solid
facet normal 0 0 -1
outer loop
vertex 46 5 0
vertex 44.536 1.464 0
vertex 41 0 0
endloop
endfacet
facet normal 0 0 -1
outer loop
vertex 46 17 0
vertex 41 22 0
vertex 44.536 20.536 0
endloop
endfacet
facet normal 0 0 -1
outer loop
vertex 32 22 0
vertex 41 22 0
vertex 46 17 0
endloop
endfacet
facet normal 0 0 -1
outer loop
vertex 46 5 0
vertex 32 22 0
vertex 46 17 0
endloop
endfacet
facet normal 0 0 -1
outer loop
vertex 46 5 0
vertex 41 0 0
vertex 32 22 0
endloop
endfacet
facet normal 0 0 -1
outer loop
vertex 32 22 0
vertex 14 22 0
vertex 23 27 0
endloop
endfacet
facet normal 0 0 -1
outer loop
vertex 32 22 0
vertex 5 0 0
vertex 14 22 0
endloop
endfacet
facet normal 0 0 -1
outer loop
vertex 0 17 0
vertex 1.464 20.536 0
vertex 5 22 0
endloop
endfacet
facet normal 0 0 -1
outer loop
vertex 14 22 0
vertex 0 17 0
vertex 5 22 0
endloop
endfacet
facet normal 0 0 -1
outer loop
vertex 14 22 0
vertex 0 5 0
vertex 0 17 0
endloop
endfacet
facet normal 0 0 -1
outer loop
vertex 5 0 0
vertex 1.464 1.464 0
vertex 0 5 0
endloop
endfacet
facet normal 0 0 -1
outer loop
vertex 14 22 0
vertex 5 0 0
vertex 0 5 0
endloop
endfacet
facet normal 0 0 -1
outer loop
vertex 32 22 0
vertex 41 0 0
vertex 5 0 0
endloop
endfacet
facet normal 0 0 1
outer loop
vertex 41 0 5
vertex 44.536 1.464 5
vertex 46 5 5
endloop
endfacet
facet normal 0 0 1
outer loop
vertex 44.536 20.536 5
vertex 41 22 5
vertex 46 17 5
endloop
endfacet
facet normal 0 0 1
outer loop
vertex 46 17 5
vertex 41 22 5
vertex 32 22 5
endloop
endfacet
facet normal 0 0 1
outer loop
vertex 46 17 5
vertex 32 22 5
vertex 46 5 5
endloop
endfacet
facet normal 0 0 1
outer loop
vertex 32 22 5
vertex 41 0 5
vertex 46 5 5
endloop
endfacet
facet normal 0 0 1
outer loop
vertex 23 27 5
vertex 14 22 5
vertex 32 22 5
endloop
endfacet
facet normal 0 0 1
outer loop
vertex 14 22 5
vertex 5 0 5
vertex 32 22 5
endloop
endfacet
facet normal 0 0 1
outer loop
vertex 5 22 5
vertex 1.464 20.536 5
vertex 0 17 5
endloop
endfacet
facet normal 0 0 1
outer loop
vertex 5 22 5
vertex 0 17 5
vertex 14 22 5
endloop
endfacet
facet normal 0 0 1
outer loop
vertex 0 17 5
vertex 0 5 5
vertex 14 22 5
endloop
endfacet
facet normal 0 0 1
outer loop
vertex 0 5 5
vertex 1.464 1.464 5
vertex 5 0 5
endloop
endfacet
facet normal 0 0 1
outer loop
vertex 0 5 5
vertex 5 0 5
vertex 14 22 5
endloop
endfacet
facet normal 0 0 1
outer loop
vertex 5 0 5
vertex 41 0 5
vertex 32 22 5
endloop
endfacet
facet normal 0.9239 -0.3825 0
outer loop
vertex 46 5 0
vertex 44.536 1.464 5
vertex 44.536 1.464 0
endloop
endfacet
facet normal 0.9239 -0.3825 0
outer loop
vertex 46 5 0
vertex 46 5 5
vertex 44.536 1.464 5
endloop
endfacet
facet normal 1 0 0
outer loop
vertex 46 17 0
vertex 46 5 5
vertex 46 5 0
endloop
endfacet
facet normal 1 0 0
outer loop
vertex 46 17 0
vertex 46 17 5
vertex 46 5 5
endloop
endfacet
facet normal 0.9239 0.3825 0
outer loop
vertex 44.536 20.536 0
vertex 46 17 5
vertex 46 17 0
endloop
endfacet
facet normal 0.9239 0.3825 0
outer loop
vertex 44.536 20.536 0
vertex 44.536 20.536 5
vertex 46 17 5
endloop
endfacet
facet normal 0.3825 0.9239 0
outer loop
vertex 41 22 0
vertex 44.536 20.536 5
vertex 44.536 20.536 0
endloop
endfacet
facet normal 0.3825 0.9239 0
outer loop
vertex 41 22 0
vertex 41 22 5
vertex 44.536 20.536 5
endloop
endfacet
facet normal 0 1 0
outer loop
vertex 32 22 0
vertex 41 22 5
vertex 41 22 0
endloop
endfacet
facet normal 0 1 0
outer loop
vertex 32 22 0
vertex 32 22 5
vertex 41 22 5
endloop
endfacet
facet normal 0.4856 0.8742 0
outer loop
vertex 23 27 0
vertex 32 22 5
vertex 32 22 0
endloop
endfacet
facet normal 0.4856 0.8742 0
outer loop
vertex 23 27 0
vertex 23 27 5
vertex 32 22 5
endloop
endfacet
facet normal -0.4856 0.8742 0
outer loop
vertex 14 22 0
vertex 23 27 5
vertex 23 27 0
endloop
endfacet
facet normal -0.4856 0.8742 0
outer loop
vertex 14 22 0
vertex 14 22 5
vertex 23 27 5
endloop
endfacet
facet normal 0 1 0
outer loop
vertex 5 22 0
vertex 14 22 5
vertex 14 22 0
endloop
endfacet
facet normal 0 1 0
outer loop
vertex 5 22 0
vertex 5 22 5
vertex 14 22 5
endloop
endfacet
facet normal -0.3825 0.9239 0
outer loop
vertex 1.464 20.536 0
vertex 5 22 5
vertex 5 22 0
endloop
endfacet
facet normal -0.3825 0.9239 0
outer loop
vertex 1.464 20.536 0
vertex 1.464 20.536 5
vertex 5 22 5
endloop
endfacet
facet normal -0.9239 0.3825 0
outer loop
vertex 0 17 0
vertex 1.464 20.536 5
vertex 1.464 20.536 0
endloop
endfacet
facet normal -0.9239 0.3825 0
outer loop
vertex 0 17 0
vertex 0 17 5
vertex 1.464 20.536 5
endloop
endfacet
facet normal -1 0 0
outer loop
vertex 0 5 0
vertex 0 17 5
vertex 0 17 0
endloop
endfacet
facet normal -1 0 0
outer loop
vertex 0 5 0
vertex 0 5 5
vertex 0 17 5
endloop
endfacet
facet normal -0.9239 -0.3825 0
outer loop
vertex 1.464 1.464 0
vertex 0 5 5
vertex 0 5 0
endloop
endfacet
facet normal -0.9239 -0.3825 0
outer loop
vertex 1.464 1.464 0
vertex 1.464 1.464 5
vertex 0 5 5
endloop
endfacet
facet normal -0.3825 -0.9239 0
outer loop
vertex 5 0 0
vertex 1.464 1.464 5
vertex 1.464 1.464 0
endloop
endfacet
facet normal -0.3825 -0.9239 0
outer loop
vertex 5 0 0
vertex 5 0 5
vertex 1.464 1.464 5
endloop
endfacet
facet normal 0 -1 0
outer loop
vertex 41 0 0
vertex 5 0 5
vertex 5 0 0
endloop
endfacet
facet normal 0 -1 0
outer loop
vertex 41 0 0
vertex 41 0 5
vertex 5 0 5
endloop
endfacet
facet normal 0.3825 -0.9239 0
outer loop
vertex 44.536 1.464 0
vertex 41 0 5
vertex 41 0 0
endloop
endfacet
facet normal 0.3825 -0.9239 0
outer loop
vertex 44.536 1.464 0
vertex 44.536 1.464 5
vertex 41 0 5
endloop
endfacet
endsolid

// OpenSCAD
$fn = 32;

// ----------------------------------------------------------------------
// Ratchet pawl: 46 x 22 mm body, beak 5 mm сверху
// ----------------------------------------------------------------------

// --- parameters (mm) ---
profile_height = 5;       // extrusion height
profile_points = 15;      // points of the closed outline

profile = [[0, 5], [1.464, 1.464], [5, 0], [41, 0], [44.536, 1.464], [46, 5], [46, 17], [44.536, 20.536], [41, 22], [32, 22], [23, 27], [14, 22], [5, 22], [1.464, 20.536], [0, 17]];  // single closed polygon, 15 points, counter clockwise

// --- the one profile operation ---
linear_extrude(height = profile_height) polygon(points = profile);
